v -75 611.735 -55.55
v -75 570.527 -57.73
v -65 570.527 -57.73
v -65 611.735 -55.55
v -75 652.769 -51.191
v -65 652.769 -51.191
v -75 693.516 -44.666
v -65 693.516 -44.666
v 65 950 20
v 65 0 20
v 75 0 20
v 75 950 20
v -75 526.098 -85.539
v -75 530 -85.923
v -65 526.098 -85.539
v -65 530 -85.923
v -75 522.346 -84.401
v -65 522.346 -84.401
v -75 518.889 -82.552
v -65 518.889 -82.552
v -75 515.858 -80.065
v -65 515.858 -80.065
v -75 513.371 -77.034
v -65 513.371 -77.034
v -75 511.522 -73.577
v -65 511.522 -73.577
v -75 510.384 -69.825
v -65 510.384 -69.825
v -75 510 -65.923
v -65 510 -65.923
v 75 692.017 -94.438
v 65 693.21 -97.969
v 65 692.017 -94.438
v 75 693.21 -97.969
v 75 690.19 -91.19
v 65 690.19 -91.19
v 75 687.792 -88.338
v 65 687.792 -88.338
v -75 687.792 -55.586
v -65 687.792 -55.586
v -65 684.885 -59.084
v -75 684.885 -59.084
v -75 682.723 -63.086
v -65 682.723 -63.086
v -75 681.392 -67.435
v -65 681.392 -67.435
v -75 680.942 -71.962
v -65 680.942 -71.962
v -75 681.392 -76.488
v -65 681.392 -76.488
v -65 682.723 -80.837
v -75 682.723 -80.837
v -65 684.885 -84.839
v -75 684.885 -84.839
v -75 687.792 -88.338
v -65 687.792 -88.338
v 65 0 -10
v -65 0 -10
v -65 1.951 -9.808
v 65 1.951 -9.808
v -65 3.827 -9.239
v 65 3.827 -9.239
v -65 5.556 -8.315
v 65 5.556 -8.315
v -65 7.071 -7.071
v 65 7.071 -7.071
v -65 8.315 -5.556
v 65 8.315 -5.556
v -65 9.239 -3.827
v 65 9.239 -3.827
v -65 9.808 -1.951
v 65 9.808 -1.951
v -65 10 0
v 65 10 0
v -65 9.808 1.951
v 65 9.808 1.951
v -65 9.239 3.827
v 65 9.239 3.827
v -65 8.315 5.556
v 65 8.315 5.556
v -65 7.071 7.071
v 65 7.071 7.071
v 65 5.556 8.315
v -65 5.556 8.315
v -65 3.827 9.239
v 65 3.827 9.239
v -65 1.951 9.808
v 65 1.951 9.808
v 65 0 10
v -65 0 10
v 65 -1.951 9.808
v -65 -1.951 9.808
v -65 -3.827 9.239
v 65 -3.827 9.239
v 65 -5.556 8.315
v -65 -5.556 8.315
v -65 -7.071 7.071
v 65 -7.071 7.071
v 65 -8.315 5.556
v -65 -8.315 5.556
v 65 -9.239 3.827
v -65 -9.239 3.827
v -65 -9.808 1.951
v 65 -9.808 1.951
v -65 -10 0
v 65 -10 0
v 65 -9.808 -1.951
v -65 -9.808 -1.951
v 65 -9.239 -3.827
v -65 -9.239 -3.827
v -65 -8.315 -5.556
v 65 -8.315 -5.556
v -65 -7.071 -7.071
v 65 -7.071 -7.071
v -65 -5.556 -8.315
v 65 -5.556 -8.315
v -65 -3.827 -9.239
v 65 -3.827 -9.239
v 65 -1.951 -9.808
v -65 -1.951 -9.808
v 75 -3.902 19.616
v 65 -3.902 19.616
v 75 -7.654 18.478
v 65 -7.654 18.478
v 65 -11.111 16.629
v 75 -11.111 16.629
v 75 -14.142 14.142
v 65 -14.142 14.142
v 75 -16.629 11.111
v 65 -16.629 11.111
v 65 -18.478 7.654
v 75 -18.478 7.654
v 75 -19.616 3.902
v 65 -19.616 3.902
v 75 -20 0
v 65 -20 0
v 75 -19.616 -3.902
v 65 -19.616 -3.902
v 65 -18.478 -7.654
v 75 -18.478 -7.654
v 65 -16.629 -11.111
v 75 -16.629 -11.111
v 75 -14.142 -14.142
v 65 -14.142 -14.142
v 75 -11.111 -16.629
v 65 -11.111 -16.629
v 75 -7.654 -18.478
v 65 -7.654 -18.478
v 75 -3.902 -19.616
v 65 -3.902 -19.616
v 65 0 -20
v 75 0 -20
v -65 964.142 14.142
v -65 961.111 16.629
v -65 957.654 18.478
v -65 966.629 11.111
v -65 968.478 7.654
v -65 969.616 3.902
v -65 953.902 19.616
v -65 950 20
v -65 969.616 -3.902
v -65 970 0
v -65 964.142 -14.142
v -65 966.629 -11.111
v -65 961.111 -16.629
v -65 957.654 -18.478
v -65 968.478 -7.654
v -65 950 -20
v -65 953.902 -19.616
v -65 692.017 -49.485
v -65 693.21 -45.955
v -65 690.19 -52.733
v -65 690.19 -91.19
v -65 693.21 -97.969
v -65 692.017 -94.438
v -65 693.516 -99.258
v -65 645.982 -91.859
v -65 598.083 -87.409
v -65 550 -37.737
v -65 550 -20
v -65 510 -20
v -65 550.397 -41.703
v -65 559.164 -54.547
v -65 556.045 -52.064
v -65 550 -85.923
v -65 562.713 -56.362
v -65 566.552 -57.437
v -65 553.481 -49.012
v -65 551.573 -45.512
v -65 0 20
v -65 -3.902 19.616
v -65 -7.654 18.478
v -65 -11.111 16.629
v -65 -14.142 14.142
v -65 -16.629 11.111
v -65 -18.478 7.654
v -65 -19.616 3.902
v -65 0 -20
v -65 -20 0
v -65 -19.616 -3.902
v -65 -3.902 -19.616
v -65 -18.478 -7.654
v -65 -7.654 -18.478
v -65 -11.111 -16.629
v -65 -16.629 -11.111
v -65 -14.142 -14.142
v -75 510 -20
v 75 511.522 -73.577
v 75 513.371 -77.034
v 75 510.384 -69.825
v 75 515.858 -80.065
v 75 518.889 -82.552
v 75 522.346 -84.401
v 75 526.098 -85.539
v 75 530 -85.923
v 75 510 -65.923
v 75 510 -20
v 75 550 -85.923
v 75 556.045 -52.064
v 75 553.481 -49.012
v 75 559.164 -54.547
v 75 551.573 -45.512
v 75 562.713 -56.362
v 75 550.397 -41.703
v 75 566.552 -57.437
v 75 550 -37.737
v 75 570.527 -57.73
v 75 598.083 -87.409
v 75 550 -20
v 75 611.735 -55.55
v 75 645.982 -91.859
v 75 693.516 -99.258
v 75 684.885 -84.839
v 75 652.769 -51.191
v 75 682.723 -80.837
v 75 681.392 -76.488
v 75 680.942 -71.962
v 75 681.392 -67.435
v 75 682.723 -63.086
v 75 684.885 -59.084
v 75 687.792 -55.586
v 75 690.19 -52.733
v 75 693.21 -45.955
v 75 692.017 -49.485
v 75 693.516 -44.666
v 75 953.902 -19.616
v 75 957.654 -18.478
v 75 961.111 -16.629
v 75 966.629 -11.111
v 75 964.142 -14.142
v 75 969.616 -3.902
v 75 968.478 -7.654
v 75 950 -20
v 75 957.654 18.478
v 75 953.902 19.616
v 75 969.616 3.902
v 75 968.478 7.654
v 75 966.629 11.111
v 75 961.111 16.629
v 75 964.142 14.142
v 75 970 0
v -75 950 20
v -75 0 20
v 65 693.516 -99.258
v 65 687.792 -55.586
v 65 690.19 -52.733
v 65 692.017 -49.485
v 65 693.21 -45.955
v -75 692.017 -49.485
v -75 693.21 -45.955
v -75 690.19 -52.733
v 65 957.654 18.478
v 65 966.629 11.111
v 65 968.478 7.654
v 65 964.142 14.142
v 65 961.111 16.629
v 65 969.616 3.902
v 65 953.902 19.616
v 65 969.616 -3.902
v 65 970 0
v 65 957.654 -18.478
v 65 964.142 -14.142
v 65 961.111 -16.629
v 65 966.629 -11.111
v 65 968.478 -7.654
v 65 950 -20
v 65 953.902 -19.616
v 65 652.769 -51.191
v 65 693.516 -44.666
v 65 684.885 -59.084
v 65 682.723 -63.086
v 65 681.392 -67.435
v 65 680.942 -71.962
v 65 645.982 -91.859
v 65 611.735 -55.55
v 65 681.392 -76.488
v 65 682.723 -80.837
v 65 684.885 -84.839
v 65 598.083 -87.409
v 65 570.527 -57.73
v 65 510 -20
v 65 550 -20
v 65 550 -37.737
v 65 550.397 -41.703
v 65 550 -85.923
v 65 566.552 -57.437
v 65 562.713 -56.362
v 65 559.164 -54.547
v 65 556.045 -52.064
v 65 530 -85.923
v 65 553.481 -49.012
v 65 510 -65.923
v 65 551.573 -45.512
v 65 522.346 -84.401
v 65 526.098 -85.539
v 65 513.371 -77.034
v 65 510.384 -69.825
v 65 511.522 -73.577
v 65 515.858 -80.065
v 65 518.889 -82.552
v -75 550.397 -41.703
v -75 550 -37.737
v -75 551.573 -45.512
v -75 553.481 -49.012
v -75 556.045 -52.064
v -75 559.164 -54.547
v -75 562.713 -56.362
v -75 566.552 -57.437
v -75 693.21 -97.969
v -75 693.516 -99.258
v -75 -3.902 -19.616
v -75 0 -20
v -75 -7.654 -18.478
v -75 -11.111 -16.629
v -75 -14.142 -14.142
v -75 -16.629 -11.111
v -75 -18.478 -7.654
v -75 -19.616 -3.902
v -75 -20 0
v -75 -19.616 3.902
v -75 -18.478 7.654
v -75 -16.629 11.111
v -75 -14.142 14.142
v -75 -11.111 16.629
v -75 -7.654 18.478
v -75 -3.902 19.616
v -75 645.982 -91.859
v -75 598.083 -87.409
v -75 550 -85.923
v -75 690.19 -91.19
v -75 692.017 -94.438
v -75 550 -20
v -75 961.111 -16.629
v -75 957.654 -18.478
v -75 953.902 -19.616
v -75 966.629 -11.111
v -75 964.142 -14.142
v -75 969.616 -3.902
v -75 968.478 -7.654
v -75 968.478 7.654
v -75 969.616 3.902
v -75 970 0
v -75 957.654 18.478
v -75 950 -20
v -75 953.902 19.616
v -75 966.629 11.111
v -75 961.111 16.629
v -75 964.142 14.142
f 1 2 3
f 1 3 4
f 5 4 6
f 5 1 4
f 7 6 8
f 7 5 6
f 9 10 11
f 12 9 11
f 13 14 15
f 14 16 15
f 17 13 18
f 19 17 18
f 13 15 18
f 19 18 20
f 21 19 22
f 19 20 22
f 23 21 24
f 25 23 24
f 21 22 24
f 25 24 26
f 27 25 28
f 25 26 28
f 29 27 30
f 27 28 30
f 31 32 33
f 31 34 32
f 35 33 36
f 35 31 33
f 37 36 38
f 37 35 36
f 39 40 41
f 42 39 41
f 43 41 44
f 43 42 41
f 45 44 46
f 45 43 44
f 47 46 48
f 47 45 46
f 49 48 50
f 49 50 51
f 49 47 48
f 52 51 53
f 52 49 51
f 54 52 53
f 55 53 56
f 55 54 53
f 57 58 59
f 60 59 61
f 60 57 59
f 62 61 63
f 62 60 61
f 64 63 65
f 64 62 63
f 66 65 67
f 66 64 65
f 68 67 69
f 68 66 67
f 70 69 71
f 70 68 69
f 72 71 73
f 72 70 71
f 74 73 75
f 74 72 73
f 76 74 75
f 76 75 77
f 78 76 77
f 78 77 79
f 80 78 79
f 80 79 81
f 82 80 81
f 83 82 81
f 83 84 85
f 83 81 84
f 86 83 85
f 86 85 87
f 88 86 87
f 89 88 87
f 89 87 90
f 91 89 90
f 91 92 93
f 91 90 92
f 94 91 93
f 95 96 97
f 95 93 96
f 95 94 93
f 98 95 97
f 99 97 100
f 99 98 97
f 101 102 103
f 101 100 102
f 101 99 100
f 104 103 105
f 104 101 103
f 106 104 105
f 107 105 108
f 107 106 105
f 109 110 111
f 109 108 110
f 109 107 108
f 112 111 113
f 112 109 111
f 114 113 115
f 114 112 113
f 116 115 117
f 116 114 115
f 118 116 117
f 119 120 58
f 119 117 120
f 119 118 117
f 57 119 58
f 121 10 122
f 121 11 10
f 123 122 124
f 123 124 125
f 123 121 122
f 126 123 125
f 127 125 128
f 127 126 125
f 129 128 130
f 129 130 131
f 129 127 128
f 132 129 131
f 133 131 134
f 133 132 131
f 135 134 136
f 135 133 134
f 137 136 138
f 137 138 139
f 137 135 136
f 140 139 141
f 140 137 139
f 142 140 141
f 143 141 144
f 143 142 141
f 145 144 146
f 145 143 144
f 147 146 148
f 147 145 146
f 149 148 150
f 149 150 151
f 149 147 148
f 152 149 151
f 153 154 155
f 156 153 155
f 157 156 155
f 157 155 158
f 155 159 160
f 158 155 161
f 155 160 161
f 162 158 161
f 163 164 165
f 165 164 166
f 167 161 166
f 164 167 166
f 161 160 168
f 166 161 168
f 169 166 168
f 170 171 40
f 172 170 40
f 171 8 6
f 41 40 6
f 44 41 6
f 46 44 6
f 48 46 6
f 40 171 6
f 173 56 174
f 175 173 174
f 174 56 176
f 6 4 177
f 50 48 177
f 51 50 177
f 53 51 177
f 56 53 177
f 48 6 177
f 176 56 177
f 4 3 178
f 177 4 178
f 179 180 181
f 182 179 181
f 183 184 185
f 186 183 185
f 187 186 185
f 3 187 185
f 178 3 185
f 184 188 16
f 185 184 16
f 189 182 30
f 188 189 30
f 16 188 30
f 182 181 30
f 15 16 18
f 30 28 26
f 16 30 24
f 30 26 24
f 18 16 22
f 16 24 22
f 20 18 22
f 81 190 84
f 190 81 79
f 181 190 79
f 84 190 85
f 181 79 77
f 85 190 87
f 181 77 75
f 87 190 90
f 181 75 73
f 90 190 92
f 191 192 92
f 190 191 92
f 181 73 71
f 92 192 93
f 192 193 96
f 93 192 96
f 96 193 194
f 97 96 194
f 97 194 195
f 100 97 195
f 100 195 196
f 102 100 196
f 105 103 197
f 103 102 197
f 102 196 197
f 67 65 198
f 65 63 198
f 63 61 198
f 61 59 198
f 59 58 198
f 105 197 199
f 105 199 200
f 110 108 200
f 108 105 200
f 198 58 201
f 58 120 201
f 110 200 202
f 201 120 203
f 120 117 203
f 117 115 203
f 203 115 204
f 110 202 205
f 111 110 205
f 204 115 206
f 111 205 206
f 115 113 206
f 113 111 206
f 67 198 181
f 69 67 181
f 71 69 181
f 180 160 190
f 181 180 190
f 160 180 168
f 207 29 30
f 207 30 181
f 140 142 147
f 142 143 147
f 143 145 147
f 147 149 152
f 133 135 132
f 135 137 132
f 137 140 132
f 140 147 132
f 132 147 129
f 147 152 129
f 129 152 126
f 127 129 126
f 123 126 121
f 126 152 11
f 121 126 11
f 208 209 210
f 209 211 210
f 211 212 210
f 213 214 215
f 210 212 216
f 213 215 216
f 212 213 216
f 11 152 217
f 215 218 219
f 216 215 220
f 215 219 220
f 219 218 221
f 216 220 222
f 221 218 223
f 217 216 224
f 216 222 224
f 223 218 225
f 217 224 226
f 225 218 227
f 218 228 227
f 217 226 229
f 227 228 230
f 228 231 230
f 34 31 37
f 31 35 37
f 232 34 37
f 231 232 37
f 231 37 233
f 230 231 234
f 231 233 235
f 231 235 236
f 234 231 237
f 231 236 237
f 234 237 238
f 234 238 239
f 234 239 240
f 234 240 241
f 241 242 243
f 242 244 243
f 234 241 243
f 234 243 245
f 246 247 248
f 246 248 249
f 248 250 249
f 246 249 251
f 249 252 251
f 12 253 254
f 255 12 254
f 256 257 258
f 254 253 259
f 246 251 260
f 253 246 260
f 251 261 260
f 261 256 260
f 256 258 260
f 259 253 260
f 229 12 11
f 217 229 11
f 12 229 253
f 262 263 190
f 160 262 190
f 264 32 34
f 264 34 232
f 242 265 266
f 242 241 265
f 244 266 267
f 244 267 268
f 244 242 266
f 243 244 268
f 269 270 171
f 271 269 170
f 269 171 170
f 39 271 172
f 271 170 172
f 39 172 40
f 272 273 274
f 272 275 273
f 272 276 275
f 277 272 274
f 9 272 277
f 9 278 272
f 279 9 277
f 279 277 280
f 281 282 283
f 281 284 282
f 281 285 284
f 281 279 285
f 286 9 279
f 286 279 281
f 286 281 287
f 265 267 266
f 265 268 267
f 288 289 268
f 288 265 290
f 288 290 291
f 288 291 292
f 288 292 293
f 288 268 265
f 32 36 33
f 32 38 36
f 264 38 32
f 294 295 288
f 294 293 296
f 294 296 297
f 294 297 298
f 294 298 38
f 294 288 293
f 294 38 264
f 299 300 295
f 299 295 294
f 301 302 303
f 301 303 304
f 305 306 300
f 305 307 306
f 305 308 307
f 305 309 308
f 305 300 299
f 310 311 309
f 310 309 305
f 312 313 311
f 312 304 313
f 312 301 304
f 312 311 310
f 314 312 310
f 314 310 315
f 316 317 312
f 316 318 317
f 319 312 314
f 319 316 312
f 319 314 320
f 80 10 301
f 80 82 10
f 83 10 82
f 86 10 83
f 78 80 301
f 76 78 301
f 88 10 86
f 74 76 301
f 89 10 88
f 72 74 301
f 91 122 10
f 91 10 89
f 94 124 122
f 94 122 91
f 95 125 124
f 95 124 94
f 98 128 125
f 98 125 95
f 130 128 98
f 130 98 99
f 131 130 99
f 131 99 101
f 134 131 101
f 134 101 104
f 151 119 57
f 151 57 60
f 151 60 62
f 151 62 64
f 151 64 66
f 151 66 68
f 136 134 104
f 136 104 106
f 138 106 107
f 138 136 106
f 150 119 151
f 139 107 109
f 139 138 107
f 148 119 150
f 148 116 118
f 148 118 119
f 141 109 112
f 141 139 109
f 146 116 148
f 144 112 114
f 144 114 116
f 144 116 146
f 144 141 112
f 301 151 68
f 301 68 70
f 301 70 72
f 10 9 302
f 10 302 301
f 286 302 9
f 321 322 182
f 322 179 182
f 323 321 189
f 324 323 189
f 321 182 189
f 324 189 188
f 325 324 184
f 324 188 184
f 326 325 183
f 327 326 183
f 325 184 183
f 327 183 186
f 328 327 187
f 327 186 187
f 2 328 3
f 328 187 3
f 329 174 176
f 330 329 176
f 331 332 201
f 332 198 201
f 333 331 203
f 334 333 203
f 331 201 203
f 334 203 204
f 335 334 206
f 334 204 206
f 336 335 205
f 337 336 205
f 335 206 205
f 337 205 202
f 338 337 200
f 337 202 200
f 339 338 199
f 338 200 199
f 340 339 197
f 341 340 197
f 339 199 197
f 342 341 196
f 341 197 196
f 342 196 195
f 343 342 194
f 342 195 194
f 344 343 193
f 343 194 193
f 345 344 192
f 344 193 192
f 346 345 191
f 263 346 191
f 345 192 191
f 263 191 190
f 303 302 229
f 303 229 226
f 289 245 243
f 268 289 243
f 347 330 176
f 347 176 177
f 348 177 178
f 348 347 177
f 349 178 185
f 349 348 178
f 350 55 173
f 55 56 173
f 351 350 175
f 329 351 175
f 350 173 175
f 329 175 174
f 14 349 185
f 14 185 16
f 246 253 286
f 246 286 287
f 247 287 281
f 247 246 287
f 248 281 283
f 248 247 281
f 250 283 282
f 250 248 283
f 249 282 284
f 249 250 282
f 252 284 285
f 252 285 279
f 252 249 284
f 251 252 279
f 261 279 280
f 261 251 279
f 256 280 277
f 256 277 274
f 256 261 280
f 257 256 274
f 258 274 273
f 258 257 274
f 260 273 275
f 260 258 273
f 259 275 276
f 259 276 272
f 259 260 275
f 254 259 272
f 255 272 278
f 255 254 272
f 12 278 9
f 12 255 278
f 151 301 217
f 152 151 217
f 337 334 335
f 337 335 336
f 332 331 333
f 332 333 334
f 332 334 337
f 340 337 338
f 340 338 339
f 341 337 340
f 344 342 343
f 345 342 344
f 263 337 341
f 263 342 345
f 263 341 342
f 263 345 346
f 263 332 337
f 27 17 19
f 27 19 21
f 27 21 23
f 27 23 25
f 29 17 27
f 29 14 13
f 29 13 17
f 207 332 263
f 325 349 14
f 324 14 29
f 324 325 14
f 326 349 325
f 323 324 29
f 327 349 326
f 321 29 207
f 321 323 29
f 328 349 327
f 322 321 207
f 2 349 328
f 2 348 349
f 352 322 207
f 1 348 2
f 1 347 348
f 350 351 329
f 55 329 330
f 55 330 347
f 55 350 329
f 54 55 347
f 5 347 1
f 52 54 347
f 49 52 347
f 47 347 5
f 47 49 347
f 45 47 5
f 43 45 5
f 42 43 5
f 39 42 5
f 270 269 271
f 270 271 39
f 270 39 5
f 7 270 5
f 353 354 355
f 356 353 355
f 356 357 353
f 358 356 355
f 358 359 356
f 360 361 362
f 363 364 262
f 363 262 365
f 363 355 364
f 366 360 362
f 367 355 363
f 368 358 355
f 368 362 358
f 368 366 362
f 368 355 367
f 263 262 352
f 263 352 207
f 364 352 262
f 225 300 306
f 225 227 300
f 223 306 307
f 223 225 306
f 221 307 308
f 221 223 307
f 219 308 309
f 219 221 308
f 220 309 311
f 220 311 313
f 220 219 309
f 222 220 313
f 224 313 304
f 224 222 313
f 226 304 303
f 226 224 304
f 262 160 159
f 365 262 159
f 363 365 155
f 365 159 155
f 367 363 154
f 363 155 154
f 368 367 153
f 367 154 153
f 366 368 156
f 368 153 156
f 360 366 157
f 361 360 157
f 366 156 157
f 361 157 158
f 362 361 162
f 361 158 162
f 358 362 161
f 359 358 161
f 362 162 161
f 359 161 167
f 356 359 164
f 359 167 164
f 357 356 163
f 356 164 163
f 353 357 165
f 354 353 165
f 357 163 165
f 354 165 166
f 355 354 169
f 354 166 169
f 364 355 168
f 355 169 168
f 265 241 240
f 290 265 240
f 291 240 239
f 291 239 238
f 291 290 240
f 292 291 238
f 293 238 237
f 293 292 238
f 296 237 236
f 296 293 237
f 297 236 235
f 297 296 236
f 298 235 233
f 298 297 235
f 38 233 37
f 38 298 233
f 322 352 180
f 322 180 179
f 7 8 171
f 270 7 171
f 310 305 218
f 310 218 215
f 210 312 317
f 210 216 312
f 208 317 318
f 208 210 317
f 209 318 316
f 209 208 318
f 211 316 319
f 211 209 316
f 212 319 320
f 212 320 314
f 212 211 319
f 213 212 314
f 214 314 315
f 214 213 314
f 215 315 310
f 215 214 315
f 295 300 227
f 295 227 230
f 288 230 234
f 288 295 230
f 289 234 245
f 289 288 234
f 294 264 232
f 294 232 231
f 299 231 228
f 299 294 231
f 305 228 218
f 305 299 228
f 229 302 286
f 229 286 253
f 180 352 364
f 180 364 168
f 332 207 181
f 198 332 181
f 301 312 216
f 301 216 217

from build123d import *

# Parameters (mm, degrees)
SKETCH_1_W        = 10
SKETCH_1_H        = 40
EXTRUDE_1_DEPTH   = 950
EXTRUDE_1_2_DEPTH = 950
SKETCH_2_R        = 10
EXTRUDE_2_DEPTH   = 150
SKETCH_3_R        = 20
EXTRUDE_3_DEPTH   = 10
EXTRUDE_START     = -10
SKETCH_4_R        = 20
EXTRUDE_4_DEPTH   = 10
EXTRUDE_5_DEPTH   = 10
EXTRUDE_6_DEPTH   = 10
FILLET_1_R        = 20


with BuildPart() as part:
    # 草图1 → 凸台-拉伸1 (new body)
    with BuildSketch(Plane(origin=(0, 0, 0), x_dir=(1, 0, 0), z_dir=(0, 1, 0))):
        with Locations((-70, 0)):
            Rectangle(SKETCH_1_W, SKETCH_1_H)
    extrude(amount=EXTRUDE_1_DEPTH)



with BuildPart() as body_2:
    # 草图1 → Extrude 1 2 (new body)
    with BuildSketch(Plane(origin=(0, 0, 0), x_dir=(1, 0, 0), z_dir=(0, 1, 0))):
        with Locations((70, 0)):
            Rectangle(SKETCH_1_W, SKETCH_1_H)
    extrude(amount=EXTRUDE_1_2_DEPTH)


with BuildPart() as part_1:
    add(part.part)

    add(body_2.part)  # 凸台-拉伸2 merges body 2
    # 草图2 → 凸台-拉伸2 (add)
    with BuildSketch(Plane(origin=(75, 0, 0), x_dir=(0, 0, -1), z_dir=(1, 0, 0))):
        Circle(SKETCH_2_R)
    extrude(amount=-EXTRUDE_2_DEPTH)

    # 草图3 → 凸台-拉伸3 (add)
    with BuildSketch(Plane(origin=(75, 0, 0), x_dir=(0, 0, -1), z_dir=(1, 0, 0))):
        with Locations((0, 950)):
            Circle(SKETCH_3_R)
        Circle(SKETCH_3_R)
    extrude(amount=-EXTRUDE_3_DEPTH)

    # 草图4 → 凸台-拉伸4 (add)
    with BuildSketch(Plane.ZY.offset(75).offset(EXTRUDE_START)):
        with Locations((0, 950)):
            Circle(SKETCH_4_R)
        Circle(SKETCH_4_R)
    extrude(amount=EXTRUDE_4_DEPTH)

    # 草图5 → 凸台-拉伸5 (add)
    with BuildSketch(Plane.ZY.offset(75)):
        with BuildLine():
            Line((-1.961717338, 550), (-58.000349557, 550))
            ThreePointArc((-58.000349557, 550), (-54.659475196, 622.066890367), (-44.665509494, 693.515604688))
            Line((-44.665509494, 693.515604688), (-52.51833449, 691.655753978))
            ThreePointArc((-52.51833449, 691.655753978), (-71.961717338, 680.941793153), (-91.405100186, 691.655753978))
            Line((-91.405100186, 691.655753978), (-99.257925182, 693.515604688))
            ThreePointArc((-99.257925182, 693.515604688), (-89.26395948, 622.066890367), (-85.923085118, 550))
            Line((-85.923085118, 550), (-85.923085118, 510))
            Line((-85.923085118, 510), (-1.961717338, 510))
            Line((-1.961717338, 510), (-1.961717338, 550))
        make_face()
    extrude(amount=-EXTRUDE_5_DEPTH)

    # 草图6 → 凸台-拉伸6 (add)
    with BuildSketch(Plane.ZY.offset(-65)):
        with BuildLine():
            Line((-1.961717338, 550), (-58.000349557, 550))
            ThreePointArc((-58.000349557, 550), (-54.659475196, 622.066890367), (-44.665509494, 693.515604688))
            Line((-44.665509494, 693.515604688), (-52.51833449, 691.655753978))
            ThreePointArc((-52.51833449, 691.655753978), (-71.961717338, 680.941793153), (-91.405100186, 691.655753978))
            Line((-91.405100186, 691.655753978), (-99.257925182, 693.515604688))
            ThreePointArc((-99.257925182, 693.515604688), (-89.26395948, 622.066890367), (-85.923085118, 550))
            Line((-85.923085118, 550), (-85.923085118, 510))
            Line((-85.923085118, 510), (-1.961717338, 510))
            Line((-1.961717338, 510), (-1.961717338, 550))
        make_face()
    extrude(amount=-EXTRUDE_6_DEPTH)

    # 圆角1
    fillet_1_edges = [part_1.edges().sort_by_distance(p)[0] for p in [
        (70, 550, -58.000349557),
        (70, 510, -85.923085118),
        (70, 691.655753978, -91.405100186),
        (70, 691.655753978, -52.51833449),
        (-70, 550, -58.000349557),
        (-70, 510, -85.923085118),
        (-70, 691.655753978, -91.405100186),
        (-70, 691.655753978, -52.51833449),
    ]]
    fillet(fillet_1_edges, radius=FILLET_1_R)


solid = part_1.part
